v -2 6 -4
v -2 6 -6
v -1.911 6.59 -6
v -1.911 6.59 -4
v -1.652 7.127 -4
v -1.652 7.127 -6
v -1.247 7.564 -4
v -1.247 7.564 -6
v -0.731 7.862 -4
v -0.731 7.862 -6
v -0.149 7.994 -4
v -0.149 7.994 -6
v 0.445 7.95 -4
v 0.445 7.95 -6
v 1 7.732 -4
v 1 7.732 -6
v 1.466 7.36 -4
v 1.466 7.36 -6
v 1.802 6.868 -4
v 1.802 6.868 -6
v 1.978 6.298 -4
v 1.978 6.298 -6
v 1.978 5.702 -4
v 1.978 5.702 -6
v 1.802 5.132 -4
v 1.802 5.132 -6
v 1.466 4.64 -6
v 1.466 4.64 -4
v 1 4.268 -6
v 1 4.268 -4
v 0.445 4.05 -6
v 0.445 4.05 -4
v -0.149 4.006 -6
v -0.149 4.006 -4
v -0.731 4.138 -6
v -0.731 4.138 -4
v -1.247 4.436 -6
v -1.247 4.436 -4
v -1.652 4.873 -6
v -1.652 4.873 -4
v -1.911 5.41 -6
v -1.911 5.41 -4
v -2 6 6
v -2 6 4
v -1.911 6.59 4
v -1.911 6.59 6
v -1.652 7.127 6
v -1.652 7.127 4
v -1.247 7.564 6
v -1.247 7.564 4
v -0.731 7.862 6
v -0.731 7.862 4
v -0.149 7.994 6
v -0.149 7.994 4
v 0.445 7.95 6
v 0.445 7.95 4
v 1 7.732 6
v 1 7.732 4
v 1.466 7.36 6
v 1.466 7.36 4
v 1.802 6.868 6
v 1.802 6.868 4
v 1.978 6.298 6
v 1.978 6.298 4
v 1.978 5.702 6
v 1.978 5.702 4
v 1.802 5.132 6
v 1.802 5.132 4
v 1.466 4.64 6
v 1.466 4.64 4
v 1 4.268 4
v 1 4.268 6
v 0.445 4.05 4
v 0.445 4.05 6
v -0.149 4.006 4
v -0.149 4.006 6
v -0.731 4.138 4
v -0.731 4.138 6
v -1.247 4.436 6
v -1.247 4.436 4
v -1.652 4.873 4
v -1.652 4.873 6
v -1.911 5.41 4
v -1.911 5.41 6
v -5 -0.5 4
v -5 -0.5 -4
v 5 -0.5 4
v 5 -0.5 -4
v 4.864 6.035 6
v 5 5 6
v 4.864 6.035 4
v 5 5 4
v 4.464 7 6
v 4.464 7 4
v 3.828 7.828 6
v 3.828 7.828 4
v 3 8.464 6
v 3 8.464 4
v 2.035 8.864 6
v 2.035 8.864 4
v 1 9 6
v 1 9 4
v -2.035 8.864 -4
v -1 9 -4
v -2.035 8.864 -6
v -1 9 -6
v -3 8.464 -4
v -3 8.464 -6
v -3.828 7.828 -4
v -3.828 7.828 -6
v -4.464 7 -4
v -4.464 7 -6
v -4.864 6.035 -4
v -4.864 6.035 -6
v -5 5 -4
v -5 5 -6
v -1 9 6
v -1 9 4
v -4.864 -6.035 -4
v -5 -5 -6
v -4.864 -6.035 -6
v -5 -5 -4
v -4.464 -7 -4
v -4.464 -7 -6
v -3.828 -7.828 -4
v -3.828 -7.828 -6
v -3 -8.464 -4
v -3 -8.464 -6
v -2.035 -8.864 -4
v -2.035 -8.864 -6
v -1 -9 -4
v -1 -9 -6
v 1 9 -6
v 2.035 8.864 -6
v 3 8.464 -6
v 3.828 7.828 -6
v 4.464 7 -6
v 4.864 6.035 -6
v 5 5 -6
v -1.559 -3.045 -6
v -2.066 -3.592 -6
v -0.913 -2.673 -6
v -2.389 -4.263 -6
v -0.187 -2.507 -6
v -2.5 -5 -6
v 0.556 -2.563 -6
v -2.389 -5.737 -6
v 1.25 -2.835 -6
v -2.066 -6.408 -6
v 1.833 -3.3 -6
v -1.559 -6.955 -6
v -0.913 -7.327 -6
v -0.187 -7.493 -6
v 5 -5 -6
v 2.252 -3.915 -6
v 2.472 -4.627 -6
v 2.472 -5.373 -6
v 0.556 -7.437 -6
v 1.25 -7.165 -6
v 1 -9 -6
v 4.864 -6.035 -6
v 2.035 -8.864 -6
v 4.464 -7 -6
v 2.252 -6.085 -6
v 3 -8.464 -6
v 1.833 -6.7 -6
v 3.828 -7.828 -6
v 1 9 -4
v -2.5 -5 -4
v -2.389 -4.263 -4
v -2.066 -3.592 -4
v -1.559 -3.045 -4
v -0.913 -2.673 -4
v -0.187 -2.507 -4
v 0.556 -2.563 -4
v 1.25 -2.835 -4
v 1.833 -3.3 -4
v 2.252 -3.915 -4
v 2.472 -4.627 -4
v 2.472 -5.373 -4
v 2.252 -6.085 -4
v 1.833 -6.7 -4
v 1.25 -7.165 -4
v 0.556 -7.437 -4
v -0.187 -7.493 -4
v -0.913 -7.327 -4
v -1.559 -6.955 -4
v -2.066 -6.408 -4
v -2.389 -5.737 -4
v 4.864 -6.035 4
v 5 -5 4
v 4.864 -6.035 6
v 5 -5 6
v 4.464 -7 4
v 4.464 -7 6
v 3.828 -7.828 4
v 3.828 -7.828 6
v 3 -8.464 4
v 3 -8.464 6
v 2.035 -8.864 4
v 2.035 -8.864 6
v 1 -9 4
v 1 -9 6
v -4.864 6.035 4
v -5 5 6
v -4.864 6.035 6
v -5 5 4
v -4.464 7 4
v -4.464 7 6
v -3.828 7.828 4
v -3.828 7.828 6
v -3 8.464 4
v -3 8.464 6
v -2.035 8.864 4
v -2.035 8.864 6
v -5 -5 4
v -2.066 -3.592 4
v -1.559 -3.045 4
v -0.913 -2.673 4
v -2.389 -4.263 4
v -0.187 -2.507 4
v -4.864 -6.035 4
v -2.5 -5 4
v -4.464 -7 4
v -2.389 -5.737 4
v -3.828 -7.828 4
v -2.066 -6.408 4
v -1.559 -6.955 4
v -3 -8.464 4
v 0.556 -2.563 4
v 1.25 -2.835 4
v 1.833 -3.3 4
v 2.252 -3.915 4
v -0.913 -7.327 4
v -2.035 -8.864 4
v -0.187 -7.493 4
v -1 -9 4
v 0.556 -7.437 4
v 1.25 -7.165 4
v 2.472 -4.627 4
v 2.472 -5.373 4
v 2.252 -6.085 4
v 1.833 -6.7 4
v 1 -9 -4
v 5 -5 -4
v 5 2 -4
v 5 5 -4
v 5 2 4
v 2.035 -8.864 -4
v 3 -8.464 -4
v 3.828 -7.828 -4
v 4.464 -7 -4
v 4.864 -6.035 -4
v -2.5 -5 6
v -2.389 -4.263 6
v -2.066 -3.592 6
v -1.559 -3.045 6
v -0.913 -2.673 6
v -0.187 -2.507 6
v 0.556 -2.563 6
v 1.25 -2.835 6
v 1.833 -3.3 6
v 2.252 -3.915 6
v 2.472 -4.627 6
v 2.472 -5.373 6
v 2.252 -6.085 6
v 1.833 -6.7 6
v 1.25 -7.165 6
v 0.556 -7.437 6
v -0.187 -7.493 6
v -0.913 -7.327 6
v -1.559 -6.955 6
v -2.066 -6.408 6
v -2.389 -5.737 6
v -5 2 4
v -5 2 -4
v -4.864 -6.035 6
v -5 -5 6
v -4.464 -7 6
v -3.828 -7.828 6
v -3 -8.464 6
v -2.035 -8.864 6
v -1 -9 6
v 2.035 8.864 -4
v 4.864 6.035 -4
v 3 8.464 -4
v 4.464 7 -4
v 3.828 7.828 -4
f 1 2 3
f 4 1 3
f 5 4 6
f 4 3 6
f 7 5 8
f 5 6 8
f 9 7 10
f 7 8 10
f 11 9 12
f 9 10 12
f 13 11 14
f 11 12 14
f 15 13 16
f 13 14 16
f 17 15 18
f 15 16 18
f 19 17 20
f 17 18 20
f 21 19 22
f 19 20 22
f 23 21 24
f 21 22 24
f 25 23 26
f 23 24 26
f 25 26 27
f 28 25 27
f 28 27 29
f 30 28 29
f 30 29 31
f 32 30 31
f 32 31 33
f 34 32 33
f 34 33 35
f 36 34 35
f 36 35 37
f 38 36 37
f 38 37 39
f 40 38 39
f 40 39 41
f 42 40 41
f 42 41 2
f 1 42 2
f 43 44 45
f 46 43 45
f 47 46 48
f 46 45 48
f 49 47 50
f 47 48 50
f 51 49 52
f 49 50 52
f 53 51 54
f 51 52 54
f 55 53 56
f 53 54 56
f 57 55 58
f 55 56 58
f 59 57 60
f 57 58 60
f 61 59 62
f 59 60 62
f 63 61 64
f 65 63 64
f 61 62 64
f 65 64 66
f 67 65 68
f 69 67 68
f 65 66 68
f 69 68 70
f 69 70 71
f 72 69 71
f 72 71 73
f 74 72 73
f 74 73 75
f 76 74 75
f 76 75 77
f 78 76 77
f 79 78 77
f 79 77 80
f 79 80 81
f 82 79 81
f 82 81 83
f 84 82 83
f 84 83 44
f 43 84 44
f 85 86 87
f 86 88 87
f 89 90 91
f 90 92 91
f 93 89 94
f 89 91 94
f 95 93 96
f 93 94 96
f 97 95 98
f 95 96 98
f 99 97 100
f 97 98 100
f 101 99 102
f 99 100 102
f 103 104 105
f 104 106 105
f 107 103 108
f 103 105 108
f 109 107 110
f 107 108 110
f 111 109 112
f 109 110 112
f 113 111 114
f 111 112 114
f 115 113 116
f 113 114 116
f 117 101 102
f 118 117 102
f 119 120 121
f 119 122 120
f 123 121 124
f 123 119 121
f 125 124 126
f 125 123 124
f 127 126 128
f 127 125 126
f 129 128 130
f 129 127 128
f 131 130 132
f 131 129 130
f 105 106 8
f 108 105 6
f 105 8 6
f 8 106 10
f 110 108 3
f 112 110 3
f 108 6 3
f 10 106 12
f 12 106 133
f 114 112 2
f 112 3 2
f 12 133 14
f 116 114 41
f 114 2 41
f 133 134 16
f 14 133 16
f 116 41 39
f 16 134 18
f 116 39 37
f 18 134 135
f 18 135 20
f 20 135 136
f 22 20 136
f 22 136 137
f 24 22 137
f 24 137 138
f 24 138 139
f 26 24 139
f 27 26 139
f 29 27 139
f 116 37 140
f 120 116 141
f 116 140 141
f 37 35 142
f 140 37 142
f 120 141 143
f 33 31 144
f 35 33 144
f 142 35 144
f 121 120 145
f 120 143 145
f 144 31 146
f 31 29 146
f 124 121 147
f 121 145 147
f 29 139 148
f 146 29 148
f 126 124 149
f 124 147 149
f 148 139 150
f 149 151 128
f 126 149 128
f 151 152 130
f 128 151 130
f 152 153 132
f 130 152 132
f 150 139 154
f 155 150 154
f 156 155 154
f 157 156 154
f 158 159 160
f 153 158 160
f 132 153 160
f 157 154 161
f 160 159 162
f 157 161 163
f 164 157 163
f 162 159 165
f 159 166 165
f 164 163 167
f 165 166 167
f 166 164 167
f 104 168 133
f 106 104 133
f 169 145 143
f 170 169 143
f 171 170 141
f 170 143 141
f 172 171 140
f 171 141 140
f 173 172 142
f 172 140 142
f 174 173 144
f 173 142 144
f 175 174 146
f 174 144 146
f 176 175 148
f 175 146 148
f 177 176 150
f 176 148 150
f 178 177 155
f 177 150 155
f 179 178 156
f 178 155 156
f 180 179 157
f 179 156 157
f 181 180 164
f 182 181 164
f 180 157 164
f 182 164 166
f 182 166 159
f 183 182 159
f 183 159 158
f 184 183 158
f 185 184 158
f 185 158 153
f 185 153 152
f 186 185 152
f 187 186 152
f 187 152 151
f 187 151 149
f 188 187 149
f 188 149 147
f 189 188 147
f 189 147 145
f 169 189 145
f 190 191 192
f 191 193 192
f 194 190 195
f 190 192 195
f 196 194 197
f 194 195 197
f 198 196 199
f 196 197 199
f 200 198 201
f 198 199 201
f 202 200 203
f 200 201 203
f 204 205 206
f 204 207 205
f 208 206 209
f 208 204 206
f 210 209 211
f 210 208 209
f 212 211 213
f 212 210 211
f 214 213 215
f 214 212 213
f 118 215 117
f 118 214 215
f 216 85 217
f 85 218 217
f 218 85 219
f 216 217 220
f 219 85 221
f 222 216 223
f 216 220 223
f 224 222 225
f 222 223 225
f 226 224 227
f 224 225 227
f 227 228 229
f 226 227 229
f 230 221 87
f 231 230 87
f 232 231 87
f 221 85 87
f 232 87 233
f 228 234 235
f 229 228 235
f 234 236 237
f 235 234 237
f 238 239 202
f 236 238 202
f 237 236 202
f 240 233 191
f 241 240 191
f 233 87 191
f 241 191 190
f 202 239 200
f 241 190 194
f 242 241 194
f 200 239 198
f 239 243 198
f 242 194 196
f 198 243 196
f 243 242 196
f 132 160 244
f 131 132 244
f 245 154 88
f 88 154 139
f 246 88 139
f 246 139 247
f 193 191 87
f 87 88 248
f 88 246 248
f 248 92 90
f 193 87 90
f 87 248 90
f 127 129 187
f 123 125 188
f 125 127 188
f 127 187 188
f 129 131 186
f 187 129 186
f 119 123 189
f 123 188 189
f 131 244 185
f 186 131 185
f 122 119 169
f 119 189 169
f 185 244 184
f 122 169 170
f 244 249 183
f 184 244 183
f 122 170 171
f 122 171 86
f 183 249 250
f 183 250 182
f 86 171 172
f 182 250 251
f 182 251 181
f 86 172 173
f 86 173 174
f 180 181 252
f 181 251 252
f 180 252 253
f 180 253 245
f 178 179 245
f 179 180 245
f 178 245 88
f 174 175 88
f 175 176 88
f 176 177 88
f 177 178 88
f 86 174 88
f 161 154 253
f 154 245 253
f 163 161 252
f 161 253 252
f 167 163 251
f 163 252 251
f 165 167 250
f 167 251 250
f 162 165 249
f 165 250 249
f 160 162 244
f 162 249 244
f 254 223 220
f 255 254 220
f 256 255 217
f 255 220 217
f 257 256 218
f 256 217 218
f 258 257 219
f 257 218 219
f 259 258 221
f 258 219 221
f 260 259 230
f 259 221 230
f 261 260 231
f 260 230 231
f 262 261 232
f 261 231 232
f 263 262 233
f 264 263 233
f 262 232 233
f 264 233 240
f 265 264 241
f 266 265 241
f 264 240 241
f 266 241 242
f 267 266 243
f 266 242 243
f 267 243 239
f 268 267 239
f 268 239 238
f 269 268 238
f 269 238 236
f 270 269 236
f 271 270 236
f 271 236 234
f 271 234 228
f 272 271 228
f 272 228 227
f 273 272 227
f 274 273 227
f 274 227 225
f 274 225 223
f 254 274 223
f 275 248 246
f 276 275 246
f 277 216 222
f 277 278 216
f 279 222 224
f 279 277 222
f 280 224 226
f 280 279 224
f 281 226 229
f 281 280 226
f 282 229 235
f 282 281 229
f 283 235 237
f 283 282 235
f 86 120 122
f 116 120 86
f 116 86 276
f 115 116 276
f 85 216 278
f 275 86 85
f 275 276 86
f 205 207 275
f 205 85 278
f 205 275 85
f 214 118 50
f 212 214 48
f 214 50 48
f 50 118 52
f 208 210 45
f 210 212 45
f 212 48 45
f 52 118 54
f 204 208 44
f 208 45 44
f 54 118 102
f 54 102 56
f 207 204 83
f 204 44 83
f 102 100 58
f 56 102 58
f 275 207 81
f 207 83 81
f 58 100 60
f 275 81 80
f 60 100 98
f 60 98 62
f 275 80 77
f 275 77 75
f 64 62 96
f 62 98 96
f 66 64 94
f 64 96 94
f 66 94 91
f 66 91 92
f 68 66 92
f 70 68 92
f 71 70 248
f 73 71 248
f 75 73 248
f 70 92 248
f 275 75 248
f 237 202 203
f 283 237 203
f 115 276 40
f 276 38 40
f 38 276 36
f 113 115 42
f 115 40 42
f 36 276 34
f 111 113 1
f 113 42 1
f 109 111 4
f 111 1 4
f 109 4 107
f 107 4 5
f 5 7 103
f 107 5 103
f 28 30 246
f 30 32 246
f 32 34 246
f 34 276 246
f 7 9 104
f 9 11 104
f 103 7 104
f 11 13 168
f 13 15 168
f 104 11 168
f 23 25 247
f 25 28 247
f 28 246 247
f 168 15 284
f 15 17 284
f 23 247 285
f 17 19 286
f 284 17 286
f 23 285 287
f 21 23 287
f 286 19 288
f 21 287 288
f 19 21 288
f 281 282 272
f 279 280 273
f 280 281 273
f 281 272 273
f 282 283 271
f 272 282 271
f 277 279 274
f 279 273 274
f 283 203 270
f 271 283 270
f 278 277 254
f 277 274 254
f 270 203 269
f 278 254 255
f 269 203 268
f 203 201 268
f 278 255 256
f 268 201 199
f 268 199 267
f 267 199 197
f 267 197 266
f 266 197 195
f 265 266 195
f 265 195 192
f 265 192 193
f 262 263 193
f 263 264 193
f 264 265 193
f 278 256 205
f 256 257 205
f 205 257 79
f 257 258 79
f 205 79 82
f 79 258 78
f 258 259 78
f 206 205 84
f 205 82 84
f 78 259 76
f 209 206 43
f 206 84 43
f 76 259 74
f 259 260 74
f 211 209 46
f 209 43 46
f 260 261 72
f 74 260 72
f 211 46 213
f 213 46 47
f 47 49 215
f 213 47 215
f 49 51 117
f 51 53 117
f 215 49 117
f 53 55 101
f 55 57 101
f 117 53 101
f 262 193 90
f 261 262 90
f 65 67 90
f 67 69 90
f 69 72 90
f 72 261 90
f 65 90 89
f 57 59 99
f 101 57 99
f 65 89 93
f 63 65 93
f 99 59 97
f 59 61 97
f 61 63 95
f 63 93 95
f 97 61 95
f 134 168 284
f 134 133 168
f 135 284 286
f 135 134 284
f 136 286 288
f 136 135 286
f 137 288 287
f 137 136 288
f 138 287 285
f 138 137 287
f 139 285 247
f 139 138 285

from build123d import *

# Parameters (mm, degrees)
SALIENTE_EXTRUIR1_DEPTH = 5
CROQUIS2_R              = 2
CROQUIS2_R_2            = 2.5
CORTAR_EXTRUIR1_DEPTH   = 12
REDONDEO1_R             = 4


with BuildPart() as part:
    # Croquis1 → Saliente-Extruir1 (new body, symmetric)
    with BuildSketch(Plane(origin=(0, 0, 0), x_dir=(0, 0, -1), z_dir=(1, 0, 0))):
        Polygon((4, 9), (6, 9), (6, -9), (4, -9), (4, -0.5), (-4, -0.5), (-4, -9), (-6, -9), (-6, 9), (-4, 9), (-4, 2), (4, 2), align=None)
    extrude(amount=SALIENTE_EXTRUIR1_DEPTH, both=True)

    # Croquis2 → Cortar-Extruir1 (cut)
    with BuildSketch(Plane(origin=(0, 0, -6), x_dir=(-1, 0, 0), z_dir=(0, 0, -1))):
        with Locations((0, 6)):
            Circle(CROQUIS2_R)
        with Locations((0, -5)):
            Circle(CROQUIS2_R_2)
    extrude(amount=-CORTAR_EXTRUIR1_DEPTH, mode=Mode.SUBTRACT)

    # Redondeo1
    redondeo1_edges = [part.edges().sort_by_distance(p)[0] for p in [
        (-5, -9, -5),
        (-5, -9, 5),
        (-5, 9, 5),
        (-5, 9, -5),
        (5, 9, 5),
        (5, -9, 5),
        (5, -9, -5),
        (5, 9, -5),
    ]]
    fillet(redondeo1_edges, radius=REDONDEO1_R)


solid = part.part
